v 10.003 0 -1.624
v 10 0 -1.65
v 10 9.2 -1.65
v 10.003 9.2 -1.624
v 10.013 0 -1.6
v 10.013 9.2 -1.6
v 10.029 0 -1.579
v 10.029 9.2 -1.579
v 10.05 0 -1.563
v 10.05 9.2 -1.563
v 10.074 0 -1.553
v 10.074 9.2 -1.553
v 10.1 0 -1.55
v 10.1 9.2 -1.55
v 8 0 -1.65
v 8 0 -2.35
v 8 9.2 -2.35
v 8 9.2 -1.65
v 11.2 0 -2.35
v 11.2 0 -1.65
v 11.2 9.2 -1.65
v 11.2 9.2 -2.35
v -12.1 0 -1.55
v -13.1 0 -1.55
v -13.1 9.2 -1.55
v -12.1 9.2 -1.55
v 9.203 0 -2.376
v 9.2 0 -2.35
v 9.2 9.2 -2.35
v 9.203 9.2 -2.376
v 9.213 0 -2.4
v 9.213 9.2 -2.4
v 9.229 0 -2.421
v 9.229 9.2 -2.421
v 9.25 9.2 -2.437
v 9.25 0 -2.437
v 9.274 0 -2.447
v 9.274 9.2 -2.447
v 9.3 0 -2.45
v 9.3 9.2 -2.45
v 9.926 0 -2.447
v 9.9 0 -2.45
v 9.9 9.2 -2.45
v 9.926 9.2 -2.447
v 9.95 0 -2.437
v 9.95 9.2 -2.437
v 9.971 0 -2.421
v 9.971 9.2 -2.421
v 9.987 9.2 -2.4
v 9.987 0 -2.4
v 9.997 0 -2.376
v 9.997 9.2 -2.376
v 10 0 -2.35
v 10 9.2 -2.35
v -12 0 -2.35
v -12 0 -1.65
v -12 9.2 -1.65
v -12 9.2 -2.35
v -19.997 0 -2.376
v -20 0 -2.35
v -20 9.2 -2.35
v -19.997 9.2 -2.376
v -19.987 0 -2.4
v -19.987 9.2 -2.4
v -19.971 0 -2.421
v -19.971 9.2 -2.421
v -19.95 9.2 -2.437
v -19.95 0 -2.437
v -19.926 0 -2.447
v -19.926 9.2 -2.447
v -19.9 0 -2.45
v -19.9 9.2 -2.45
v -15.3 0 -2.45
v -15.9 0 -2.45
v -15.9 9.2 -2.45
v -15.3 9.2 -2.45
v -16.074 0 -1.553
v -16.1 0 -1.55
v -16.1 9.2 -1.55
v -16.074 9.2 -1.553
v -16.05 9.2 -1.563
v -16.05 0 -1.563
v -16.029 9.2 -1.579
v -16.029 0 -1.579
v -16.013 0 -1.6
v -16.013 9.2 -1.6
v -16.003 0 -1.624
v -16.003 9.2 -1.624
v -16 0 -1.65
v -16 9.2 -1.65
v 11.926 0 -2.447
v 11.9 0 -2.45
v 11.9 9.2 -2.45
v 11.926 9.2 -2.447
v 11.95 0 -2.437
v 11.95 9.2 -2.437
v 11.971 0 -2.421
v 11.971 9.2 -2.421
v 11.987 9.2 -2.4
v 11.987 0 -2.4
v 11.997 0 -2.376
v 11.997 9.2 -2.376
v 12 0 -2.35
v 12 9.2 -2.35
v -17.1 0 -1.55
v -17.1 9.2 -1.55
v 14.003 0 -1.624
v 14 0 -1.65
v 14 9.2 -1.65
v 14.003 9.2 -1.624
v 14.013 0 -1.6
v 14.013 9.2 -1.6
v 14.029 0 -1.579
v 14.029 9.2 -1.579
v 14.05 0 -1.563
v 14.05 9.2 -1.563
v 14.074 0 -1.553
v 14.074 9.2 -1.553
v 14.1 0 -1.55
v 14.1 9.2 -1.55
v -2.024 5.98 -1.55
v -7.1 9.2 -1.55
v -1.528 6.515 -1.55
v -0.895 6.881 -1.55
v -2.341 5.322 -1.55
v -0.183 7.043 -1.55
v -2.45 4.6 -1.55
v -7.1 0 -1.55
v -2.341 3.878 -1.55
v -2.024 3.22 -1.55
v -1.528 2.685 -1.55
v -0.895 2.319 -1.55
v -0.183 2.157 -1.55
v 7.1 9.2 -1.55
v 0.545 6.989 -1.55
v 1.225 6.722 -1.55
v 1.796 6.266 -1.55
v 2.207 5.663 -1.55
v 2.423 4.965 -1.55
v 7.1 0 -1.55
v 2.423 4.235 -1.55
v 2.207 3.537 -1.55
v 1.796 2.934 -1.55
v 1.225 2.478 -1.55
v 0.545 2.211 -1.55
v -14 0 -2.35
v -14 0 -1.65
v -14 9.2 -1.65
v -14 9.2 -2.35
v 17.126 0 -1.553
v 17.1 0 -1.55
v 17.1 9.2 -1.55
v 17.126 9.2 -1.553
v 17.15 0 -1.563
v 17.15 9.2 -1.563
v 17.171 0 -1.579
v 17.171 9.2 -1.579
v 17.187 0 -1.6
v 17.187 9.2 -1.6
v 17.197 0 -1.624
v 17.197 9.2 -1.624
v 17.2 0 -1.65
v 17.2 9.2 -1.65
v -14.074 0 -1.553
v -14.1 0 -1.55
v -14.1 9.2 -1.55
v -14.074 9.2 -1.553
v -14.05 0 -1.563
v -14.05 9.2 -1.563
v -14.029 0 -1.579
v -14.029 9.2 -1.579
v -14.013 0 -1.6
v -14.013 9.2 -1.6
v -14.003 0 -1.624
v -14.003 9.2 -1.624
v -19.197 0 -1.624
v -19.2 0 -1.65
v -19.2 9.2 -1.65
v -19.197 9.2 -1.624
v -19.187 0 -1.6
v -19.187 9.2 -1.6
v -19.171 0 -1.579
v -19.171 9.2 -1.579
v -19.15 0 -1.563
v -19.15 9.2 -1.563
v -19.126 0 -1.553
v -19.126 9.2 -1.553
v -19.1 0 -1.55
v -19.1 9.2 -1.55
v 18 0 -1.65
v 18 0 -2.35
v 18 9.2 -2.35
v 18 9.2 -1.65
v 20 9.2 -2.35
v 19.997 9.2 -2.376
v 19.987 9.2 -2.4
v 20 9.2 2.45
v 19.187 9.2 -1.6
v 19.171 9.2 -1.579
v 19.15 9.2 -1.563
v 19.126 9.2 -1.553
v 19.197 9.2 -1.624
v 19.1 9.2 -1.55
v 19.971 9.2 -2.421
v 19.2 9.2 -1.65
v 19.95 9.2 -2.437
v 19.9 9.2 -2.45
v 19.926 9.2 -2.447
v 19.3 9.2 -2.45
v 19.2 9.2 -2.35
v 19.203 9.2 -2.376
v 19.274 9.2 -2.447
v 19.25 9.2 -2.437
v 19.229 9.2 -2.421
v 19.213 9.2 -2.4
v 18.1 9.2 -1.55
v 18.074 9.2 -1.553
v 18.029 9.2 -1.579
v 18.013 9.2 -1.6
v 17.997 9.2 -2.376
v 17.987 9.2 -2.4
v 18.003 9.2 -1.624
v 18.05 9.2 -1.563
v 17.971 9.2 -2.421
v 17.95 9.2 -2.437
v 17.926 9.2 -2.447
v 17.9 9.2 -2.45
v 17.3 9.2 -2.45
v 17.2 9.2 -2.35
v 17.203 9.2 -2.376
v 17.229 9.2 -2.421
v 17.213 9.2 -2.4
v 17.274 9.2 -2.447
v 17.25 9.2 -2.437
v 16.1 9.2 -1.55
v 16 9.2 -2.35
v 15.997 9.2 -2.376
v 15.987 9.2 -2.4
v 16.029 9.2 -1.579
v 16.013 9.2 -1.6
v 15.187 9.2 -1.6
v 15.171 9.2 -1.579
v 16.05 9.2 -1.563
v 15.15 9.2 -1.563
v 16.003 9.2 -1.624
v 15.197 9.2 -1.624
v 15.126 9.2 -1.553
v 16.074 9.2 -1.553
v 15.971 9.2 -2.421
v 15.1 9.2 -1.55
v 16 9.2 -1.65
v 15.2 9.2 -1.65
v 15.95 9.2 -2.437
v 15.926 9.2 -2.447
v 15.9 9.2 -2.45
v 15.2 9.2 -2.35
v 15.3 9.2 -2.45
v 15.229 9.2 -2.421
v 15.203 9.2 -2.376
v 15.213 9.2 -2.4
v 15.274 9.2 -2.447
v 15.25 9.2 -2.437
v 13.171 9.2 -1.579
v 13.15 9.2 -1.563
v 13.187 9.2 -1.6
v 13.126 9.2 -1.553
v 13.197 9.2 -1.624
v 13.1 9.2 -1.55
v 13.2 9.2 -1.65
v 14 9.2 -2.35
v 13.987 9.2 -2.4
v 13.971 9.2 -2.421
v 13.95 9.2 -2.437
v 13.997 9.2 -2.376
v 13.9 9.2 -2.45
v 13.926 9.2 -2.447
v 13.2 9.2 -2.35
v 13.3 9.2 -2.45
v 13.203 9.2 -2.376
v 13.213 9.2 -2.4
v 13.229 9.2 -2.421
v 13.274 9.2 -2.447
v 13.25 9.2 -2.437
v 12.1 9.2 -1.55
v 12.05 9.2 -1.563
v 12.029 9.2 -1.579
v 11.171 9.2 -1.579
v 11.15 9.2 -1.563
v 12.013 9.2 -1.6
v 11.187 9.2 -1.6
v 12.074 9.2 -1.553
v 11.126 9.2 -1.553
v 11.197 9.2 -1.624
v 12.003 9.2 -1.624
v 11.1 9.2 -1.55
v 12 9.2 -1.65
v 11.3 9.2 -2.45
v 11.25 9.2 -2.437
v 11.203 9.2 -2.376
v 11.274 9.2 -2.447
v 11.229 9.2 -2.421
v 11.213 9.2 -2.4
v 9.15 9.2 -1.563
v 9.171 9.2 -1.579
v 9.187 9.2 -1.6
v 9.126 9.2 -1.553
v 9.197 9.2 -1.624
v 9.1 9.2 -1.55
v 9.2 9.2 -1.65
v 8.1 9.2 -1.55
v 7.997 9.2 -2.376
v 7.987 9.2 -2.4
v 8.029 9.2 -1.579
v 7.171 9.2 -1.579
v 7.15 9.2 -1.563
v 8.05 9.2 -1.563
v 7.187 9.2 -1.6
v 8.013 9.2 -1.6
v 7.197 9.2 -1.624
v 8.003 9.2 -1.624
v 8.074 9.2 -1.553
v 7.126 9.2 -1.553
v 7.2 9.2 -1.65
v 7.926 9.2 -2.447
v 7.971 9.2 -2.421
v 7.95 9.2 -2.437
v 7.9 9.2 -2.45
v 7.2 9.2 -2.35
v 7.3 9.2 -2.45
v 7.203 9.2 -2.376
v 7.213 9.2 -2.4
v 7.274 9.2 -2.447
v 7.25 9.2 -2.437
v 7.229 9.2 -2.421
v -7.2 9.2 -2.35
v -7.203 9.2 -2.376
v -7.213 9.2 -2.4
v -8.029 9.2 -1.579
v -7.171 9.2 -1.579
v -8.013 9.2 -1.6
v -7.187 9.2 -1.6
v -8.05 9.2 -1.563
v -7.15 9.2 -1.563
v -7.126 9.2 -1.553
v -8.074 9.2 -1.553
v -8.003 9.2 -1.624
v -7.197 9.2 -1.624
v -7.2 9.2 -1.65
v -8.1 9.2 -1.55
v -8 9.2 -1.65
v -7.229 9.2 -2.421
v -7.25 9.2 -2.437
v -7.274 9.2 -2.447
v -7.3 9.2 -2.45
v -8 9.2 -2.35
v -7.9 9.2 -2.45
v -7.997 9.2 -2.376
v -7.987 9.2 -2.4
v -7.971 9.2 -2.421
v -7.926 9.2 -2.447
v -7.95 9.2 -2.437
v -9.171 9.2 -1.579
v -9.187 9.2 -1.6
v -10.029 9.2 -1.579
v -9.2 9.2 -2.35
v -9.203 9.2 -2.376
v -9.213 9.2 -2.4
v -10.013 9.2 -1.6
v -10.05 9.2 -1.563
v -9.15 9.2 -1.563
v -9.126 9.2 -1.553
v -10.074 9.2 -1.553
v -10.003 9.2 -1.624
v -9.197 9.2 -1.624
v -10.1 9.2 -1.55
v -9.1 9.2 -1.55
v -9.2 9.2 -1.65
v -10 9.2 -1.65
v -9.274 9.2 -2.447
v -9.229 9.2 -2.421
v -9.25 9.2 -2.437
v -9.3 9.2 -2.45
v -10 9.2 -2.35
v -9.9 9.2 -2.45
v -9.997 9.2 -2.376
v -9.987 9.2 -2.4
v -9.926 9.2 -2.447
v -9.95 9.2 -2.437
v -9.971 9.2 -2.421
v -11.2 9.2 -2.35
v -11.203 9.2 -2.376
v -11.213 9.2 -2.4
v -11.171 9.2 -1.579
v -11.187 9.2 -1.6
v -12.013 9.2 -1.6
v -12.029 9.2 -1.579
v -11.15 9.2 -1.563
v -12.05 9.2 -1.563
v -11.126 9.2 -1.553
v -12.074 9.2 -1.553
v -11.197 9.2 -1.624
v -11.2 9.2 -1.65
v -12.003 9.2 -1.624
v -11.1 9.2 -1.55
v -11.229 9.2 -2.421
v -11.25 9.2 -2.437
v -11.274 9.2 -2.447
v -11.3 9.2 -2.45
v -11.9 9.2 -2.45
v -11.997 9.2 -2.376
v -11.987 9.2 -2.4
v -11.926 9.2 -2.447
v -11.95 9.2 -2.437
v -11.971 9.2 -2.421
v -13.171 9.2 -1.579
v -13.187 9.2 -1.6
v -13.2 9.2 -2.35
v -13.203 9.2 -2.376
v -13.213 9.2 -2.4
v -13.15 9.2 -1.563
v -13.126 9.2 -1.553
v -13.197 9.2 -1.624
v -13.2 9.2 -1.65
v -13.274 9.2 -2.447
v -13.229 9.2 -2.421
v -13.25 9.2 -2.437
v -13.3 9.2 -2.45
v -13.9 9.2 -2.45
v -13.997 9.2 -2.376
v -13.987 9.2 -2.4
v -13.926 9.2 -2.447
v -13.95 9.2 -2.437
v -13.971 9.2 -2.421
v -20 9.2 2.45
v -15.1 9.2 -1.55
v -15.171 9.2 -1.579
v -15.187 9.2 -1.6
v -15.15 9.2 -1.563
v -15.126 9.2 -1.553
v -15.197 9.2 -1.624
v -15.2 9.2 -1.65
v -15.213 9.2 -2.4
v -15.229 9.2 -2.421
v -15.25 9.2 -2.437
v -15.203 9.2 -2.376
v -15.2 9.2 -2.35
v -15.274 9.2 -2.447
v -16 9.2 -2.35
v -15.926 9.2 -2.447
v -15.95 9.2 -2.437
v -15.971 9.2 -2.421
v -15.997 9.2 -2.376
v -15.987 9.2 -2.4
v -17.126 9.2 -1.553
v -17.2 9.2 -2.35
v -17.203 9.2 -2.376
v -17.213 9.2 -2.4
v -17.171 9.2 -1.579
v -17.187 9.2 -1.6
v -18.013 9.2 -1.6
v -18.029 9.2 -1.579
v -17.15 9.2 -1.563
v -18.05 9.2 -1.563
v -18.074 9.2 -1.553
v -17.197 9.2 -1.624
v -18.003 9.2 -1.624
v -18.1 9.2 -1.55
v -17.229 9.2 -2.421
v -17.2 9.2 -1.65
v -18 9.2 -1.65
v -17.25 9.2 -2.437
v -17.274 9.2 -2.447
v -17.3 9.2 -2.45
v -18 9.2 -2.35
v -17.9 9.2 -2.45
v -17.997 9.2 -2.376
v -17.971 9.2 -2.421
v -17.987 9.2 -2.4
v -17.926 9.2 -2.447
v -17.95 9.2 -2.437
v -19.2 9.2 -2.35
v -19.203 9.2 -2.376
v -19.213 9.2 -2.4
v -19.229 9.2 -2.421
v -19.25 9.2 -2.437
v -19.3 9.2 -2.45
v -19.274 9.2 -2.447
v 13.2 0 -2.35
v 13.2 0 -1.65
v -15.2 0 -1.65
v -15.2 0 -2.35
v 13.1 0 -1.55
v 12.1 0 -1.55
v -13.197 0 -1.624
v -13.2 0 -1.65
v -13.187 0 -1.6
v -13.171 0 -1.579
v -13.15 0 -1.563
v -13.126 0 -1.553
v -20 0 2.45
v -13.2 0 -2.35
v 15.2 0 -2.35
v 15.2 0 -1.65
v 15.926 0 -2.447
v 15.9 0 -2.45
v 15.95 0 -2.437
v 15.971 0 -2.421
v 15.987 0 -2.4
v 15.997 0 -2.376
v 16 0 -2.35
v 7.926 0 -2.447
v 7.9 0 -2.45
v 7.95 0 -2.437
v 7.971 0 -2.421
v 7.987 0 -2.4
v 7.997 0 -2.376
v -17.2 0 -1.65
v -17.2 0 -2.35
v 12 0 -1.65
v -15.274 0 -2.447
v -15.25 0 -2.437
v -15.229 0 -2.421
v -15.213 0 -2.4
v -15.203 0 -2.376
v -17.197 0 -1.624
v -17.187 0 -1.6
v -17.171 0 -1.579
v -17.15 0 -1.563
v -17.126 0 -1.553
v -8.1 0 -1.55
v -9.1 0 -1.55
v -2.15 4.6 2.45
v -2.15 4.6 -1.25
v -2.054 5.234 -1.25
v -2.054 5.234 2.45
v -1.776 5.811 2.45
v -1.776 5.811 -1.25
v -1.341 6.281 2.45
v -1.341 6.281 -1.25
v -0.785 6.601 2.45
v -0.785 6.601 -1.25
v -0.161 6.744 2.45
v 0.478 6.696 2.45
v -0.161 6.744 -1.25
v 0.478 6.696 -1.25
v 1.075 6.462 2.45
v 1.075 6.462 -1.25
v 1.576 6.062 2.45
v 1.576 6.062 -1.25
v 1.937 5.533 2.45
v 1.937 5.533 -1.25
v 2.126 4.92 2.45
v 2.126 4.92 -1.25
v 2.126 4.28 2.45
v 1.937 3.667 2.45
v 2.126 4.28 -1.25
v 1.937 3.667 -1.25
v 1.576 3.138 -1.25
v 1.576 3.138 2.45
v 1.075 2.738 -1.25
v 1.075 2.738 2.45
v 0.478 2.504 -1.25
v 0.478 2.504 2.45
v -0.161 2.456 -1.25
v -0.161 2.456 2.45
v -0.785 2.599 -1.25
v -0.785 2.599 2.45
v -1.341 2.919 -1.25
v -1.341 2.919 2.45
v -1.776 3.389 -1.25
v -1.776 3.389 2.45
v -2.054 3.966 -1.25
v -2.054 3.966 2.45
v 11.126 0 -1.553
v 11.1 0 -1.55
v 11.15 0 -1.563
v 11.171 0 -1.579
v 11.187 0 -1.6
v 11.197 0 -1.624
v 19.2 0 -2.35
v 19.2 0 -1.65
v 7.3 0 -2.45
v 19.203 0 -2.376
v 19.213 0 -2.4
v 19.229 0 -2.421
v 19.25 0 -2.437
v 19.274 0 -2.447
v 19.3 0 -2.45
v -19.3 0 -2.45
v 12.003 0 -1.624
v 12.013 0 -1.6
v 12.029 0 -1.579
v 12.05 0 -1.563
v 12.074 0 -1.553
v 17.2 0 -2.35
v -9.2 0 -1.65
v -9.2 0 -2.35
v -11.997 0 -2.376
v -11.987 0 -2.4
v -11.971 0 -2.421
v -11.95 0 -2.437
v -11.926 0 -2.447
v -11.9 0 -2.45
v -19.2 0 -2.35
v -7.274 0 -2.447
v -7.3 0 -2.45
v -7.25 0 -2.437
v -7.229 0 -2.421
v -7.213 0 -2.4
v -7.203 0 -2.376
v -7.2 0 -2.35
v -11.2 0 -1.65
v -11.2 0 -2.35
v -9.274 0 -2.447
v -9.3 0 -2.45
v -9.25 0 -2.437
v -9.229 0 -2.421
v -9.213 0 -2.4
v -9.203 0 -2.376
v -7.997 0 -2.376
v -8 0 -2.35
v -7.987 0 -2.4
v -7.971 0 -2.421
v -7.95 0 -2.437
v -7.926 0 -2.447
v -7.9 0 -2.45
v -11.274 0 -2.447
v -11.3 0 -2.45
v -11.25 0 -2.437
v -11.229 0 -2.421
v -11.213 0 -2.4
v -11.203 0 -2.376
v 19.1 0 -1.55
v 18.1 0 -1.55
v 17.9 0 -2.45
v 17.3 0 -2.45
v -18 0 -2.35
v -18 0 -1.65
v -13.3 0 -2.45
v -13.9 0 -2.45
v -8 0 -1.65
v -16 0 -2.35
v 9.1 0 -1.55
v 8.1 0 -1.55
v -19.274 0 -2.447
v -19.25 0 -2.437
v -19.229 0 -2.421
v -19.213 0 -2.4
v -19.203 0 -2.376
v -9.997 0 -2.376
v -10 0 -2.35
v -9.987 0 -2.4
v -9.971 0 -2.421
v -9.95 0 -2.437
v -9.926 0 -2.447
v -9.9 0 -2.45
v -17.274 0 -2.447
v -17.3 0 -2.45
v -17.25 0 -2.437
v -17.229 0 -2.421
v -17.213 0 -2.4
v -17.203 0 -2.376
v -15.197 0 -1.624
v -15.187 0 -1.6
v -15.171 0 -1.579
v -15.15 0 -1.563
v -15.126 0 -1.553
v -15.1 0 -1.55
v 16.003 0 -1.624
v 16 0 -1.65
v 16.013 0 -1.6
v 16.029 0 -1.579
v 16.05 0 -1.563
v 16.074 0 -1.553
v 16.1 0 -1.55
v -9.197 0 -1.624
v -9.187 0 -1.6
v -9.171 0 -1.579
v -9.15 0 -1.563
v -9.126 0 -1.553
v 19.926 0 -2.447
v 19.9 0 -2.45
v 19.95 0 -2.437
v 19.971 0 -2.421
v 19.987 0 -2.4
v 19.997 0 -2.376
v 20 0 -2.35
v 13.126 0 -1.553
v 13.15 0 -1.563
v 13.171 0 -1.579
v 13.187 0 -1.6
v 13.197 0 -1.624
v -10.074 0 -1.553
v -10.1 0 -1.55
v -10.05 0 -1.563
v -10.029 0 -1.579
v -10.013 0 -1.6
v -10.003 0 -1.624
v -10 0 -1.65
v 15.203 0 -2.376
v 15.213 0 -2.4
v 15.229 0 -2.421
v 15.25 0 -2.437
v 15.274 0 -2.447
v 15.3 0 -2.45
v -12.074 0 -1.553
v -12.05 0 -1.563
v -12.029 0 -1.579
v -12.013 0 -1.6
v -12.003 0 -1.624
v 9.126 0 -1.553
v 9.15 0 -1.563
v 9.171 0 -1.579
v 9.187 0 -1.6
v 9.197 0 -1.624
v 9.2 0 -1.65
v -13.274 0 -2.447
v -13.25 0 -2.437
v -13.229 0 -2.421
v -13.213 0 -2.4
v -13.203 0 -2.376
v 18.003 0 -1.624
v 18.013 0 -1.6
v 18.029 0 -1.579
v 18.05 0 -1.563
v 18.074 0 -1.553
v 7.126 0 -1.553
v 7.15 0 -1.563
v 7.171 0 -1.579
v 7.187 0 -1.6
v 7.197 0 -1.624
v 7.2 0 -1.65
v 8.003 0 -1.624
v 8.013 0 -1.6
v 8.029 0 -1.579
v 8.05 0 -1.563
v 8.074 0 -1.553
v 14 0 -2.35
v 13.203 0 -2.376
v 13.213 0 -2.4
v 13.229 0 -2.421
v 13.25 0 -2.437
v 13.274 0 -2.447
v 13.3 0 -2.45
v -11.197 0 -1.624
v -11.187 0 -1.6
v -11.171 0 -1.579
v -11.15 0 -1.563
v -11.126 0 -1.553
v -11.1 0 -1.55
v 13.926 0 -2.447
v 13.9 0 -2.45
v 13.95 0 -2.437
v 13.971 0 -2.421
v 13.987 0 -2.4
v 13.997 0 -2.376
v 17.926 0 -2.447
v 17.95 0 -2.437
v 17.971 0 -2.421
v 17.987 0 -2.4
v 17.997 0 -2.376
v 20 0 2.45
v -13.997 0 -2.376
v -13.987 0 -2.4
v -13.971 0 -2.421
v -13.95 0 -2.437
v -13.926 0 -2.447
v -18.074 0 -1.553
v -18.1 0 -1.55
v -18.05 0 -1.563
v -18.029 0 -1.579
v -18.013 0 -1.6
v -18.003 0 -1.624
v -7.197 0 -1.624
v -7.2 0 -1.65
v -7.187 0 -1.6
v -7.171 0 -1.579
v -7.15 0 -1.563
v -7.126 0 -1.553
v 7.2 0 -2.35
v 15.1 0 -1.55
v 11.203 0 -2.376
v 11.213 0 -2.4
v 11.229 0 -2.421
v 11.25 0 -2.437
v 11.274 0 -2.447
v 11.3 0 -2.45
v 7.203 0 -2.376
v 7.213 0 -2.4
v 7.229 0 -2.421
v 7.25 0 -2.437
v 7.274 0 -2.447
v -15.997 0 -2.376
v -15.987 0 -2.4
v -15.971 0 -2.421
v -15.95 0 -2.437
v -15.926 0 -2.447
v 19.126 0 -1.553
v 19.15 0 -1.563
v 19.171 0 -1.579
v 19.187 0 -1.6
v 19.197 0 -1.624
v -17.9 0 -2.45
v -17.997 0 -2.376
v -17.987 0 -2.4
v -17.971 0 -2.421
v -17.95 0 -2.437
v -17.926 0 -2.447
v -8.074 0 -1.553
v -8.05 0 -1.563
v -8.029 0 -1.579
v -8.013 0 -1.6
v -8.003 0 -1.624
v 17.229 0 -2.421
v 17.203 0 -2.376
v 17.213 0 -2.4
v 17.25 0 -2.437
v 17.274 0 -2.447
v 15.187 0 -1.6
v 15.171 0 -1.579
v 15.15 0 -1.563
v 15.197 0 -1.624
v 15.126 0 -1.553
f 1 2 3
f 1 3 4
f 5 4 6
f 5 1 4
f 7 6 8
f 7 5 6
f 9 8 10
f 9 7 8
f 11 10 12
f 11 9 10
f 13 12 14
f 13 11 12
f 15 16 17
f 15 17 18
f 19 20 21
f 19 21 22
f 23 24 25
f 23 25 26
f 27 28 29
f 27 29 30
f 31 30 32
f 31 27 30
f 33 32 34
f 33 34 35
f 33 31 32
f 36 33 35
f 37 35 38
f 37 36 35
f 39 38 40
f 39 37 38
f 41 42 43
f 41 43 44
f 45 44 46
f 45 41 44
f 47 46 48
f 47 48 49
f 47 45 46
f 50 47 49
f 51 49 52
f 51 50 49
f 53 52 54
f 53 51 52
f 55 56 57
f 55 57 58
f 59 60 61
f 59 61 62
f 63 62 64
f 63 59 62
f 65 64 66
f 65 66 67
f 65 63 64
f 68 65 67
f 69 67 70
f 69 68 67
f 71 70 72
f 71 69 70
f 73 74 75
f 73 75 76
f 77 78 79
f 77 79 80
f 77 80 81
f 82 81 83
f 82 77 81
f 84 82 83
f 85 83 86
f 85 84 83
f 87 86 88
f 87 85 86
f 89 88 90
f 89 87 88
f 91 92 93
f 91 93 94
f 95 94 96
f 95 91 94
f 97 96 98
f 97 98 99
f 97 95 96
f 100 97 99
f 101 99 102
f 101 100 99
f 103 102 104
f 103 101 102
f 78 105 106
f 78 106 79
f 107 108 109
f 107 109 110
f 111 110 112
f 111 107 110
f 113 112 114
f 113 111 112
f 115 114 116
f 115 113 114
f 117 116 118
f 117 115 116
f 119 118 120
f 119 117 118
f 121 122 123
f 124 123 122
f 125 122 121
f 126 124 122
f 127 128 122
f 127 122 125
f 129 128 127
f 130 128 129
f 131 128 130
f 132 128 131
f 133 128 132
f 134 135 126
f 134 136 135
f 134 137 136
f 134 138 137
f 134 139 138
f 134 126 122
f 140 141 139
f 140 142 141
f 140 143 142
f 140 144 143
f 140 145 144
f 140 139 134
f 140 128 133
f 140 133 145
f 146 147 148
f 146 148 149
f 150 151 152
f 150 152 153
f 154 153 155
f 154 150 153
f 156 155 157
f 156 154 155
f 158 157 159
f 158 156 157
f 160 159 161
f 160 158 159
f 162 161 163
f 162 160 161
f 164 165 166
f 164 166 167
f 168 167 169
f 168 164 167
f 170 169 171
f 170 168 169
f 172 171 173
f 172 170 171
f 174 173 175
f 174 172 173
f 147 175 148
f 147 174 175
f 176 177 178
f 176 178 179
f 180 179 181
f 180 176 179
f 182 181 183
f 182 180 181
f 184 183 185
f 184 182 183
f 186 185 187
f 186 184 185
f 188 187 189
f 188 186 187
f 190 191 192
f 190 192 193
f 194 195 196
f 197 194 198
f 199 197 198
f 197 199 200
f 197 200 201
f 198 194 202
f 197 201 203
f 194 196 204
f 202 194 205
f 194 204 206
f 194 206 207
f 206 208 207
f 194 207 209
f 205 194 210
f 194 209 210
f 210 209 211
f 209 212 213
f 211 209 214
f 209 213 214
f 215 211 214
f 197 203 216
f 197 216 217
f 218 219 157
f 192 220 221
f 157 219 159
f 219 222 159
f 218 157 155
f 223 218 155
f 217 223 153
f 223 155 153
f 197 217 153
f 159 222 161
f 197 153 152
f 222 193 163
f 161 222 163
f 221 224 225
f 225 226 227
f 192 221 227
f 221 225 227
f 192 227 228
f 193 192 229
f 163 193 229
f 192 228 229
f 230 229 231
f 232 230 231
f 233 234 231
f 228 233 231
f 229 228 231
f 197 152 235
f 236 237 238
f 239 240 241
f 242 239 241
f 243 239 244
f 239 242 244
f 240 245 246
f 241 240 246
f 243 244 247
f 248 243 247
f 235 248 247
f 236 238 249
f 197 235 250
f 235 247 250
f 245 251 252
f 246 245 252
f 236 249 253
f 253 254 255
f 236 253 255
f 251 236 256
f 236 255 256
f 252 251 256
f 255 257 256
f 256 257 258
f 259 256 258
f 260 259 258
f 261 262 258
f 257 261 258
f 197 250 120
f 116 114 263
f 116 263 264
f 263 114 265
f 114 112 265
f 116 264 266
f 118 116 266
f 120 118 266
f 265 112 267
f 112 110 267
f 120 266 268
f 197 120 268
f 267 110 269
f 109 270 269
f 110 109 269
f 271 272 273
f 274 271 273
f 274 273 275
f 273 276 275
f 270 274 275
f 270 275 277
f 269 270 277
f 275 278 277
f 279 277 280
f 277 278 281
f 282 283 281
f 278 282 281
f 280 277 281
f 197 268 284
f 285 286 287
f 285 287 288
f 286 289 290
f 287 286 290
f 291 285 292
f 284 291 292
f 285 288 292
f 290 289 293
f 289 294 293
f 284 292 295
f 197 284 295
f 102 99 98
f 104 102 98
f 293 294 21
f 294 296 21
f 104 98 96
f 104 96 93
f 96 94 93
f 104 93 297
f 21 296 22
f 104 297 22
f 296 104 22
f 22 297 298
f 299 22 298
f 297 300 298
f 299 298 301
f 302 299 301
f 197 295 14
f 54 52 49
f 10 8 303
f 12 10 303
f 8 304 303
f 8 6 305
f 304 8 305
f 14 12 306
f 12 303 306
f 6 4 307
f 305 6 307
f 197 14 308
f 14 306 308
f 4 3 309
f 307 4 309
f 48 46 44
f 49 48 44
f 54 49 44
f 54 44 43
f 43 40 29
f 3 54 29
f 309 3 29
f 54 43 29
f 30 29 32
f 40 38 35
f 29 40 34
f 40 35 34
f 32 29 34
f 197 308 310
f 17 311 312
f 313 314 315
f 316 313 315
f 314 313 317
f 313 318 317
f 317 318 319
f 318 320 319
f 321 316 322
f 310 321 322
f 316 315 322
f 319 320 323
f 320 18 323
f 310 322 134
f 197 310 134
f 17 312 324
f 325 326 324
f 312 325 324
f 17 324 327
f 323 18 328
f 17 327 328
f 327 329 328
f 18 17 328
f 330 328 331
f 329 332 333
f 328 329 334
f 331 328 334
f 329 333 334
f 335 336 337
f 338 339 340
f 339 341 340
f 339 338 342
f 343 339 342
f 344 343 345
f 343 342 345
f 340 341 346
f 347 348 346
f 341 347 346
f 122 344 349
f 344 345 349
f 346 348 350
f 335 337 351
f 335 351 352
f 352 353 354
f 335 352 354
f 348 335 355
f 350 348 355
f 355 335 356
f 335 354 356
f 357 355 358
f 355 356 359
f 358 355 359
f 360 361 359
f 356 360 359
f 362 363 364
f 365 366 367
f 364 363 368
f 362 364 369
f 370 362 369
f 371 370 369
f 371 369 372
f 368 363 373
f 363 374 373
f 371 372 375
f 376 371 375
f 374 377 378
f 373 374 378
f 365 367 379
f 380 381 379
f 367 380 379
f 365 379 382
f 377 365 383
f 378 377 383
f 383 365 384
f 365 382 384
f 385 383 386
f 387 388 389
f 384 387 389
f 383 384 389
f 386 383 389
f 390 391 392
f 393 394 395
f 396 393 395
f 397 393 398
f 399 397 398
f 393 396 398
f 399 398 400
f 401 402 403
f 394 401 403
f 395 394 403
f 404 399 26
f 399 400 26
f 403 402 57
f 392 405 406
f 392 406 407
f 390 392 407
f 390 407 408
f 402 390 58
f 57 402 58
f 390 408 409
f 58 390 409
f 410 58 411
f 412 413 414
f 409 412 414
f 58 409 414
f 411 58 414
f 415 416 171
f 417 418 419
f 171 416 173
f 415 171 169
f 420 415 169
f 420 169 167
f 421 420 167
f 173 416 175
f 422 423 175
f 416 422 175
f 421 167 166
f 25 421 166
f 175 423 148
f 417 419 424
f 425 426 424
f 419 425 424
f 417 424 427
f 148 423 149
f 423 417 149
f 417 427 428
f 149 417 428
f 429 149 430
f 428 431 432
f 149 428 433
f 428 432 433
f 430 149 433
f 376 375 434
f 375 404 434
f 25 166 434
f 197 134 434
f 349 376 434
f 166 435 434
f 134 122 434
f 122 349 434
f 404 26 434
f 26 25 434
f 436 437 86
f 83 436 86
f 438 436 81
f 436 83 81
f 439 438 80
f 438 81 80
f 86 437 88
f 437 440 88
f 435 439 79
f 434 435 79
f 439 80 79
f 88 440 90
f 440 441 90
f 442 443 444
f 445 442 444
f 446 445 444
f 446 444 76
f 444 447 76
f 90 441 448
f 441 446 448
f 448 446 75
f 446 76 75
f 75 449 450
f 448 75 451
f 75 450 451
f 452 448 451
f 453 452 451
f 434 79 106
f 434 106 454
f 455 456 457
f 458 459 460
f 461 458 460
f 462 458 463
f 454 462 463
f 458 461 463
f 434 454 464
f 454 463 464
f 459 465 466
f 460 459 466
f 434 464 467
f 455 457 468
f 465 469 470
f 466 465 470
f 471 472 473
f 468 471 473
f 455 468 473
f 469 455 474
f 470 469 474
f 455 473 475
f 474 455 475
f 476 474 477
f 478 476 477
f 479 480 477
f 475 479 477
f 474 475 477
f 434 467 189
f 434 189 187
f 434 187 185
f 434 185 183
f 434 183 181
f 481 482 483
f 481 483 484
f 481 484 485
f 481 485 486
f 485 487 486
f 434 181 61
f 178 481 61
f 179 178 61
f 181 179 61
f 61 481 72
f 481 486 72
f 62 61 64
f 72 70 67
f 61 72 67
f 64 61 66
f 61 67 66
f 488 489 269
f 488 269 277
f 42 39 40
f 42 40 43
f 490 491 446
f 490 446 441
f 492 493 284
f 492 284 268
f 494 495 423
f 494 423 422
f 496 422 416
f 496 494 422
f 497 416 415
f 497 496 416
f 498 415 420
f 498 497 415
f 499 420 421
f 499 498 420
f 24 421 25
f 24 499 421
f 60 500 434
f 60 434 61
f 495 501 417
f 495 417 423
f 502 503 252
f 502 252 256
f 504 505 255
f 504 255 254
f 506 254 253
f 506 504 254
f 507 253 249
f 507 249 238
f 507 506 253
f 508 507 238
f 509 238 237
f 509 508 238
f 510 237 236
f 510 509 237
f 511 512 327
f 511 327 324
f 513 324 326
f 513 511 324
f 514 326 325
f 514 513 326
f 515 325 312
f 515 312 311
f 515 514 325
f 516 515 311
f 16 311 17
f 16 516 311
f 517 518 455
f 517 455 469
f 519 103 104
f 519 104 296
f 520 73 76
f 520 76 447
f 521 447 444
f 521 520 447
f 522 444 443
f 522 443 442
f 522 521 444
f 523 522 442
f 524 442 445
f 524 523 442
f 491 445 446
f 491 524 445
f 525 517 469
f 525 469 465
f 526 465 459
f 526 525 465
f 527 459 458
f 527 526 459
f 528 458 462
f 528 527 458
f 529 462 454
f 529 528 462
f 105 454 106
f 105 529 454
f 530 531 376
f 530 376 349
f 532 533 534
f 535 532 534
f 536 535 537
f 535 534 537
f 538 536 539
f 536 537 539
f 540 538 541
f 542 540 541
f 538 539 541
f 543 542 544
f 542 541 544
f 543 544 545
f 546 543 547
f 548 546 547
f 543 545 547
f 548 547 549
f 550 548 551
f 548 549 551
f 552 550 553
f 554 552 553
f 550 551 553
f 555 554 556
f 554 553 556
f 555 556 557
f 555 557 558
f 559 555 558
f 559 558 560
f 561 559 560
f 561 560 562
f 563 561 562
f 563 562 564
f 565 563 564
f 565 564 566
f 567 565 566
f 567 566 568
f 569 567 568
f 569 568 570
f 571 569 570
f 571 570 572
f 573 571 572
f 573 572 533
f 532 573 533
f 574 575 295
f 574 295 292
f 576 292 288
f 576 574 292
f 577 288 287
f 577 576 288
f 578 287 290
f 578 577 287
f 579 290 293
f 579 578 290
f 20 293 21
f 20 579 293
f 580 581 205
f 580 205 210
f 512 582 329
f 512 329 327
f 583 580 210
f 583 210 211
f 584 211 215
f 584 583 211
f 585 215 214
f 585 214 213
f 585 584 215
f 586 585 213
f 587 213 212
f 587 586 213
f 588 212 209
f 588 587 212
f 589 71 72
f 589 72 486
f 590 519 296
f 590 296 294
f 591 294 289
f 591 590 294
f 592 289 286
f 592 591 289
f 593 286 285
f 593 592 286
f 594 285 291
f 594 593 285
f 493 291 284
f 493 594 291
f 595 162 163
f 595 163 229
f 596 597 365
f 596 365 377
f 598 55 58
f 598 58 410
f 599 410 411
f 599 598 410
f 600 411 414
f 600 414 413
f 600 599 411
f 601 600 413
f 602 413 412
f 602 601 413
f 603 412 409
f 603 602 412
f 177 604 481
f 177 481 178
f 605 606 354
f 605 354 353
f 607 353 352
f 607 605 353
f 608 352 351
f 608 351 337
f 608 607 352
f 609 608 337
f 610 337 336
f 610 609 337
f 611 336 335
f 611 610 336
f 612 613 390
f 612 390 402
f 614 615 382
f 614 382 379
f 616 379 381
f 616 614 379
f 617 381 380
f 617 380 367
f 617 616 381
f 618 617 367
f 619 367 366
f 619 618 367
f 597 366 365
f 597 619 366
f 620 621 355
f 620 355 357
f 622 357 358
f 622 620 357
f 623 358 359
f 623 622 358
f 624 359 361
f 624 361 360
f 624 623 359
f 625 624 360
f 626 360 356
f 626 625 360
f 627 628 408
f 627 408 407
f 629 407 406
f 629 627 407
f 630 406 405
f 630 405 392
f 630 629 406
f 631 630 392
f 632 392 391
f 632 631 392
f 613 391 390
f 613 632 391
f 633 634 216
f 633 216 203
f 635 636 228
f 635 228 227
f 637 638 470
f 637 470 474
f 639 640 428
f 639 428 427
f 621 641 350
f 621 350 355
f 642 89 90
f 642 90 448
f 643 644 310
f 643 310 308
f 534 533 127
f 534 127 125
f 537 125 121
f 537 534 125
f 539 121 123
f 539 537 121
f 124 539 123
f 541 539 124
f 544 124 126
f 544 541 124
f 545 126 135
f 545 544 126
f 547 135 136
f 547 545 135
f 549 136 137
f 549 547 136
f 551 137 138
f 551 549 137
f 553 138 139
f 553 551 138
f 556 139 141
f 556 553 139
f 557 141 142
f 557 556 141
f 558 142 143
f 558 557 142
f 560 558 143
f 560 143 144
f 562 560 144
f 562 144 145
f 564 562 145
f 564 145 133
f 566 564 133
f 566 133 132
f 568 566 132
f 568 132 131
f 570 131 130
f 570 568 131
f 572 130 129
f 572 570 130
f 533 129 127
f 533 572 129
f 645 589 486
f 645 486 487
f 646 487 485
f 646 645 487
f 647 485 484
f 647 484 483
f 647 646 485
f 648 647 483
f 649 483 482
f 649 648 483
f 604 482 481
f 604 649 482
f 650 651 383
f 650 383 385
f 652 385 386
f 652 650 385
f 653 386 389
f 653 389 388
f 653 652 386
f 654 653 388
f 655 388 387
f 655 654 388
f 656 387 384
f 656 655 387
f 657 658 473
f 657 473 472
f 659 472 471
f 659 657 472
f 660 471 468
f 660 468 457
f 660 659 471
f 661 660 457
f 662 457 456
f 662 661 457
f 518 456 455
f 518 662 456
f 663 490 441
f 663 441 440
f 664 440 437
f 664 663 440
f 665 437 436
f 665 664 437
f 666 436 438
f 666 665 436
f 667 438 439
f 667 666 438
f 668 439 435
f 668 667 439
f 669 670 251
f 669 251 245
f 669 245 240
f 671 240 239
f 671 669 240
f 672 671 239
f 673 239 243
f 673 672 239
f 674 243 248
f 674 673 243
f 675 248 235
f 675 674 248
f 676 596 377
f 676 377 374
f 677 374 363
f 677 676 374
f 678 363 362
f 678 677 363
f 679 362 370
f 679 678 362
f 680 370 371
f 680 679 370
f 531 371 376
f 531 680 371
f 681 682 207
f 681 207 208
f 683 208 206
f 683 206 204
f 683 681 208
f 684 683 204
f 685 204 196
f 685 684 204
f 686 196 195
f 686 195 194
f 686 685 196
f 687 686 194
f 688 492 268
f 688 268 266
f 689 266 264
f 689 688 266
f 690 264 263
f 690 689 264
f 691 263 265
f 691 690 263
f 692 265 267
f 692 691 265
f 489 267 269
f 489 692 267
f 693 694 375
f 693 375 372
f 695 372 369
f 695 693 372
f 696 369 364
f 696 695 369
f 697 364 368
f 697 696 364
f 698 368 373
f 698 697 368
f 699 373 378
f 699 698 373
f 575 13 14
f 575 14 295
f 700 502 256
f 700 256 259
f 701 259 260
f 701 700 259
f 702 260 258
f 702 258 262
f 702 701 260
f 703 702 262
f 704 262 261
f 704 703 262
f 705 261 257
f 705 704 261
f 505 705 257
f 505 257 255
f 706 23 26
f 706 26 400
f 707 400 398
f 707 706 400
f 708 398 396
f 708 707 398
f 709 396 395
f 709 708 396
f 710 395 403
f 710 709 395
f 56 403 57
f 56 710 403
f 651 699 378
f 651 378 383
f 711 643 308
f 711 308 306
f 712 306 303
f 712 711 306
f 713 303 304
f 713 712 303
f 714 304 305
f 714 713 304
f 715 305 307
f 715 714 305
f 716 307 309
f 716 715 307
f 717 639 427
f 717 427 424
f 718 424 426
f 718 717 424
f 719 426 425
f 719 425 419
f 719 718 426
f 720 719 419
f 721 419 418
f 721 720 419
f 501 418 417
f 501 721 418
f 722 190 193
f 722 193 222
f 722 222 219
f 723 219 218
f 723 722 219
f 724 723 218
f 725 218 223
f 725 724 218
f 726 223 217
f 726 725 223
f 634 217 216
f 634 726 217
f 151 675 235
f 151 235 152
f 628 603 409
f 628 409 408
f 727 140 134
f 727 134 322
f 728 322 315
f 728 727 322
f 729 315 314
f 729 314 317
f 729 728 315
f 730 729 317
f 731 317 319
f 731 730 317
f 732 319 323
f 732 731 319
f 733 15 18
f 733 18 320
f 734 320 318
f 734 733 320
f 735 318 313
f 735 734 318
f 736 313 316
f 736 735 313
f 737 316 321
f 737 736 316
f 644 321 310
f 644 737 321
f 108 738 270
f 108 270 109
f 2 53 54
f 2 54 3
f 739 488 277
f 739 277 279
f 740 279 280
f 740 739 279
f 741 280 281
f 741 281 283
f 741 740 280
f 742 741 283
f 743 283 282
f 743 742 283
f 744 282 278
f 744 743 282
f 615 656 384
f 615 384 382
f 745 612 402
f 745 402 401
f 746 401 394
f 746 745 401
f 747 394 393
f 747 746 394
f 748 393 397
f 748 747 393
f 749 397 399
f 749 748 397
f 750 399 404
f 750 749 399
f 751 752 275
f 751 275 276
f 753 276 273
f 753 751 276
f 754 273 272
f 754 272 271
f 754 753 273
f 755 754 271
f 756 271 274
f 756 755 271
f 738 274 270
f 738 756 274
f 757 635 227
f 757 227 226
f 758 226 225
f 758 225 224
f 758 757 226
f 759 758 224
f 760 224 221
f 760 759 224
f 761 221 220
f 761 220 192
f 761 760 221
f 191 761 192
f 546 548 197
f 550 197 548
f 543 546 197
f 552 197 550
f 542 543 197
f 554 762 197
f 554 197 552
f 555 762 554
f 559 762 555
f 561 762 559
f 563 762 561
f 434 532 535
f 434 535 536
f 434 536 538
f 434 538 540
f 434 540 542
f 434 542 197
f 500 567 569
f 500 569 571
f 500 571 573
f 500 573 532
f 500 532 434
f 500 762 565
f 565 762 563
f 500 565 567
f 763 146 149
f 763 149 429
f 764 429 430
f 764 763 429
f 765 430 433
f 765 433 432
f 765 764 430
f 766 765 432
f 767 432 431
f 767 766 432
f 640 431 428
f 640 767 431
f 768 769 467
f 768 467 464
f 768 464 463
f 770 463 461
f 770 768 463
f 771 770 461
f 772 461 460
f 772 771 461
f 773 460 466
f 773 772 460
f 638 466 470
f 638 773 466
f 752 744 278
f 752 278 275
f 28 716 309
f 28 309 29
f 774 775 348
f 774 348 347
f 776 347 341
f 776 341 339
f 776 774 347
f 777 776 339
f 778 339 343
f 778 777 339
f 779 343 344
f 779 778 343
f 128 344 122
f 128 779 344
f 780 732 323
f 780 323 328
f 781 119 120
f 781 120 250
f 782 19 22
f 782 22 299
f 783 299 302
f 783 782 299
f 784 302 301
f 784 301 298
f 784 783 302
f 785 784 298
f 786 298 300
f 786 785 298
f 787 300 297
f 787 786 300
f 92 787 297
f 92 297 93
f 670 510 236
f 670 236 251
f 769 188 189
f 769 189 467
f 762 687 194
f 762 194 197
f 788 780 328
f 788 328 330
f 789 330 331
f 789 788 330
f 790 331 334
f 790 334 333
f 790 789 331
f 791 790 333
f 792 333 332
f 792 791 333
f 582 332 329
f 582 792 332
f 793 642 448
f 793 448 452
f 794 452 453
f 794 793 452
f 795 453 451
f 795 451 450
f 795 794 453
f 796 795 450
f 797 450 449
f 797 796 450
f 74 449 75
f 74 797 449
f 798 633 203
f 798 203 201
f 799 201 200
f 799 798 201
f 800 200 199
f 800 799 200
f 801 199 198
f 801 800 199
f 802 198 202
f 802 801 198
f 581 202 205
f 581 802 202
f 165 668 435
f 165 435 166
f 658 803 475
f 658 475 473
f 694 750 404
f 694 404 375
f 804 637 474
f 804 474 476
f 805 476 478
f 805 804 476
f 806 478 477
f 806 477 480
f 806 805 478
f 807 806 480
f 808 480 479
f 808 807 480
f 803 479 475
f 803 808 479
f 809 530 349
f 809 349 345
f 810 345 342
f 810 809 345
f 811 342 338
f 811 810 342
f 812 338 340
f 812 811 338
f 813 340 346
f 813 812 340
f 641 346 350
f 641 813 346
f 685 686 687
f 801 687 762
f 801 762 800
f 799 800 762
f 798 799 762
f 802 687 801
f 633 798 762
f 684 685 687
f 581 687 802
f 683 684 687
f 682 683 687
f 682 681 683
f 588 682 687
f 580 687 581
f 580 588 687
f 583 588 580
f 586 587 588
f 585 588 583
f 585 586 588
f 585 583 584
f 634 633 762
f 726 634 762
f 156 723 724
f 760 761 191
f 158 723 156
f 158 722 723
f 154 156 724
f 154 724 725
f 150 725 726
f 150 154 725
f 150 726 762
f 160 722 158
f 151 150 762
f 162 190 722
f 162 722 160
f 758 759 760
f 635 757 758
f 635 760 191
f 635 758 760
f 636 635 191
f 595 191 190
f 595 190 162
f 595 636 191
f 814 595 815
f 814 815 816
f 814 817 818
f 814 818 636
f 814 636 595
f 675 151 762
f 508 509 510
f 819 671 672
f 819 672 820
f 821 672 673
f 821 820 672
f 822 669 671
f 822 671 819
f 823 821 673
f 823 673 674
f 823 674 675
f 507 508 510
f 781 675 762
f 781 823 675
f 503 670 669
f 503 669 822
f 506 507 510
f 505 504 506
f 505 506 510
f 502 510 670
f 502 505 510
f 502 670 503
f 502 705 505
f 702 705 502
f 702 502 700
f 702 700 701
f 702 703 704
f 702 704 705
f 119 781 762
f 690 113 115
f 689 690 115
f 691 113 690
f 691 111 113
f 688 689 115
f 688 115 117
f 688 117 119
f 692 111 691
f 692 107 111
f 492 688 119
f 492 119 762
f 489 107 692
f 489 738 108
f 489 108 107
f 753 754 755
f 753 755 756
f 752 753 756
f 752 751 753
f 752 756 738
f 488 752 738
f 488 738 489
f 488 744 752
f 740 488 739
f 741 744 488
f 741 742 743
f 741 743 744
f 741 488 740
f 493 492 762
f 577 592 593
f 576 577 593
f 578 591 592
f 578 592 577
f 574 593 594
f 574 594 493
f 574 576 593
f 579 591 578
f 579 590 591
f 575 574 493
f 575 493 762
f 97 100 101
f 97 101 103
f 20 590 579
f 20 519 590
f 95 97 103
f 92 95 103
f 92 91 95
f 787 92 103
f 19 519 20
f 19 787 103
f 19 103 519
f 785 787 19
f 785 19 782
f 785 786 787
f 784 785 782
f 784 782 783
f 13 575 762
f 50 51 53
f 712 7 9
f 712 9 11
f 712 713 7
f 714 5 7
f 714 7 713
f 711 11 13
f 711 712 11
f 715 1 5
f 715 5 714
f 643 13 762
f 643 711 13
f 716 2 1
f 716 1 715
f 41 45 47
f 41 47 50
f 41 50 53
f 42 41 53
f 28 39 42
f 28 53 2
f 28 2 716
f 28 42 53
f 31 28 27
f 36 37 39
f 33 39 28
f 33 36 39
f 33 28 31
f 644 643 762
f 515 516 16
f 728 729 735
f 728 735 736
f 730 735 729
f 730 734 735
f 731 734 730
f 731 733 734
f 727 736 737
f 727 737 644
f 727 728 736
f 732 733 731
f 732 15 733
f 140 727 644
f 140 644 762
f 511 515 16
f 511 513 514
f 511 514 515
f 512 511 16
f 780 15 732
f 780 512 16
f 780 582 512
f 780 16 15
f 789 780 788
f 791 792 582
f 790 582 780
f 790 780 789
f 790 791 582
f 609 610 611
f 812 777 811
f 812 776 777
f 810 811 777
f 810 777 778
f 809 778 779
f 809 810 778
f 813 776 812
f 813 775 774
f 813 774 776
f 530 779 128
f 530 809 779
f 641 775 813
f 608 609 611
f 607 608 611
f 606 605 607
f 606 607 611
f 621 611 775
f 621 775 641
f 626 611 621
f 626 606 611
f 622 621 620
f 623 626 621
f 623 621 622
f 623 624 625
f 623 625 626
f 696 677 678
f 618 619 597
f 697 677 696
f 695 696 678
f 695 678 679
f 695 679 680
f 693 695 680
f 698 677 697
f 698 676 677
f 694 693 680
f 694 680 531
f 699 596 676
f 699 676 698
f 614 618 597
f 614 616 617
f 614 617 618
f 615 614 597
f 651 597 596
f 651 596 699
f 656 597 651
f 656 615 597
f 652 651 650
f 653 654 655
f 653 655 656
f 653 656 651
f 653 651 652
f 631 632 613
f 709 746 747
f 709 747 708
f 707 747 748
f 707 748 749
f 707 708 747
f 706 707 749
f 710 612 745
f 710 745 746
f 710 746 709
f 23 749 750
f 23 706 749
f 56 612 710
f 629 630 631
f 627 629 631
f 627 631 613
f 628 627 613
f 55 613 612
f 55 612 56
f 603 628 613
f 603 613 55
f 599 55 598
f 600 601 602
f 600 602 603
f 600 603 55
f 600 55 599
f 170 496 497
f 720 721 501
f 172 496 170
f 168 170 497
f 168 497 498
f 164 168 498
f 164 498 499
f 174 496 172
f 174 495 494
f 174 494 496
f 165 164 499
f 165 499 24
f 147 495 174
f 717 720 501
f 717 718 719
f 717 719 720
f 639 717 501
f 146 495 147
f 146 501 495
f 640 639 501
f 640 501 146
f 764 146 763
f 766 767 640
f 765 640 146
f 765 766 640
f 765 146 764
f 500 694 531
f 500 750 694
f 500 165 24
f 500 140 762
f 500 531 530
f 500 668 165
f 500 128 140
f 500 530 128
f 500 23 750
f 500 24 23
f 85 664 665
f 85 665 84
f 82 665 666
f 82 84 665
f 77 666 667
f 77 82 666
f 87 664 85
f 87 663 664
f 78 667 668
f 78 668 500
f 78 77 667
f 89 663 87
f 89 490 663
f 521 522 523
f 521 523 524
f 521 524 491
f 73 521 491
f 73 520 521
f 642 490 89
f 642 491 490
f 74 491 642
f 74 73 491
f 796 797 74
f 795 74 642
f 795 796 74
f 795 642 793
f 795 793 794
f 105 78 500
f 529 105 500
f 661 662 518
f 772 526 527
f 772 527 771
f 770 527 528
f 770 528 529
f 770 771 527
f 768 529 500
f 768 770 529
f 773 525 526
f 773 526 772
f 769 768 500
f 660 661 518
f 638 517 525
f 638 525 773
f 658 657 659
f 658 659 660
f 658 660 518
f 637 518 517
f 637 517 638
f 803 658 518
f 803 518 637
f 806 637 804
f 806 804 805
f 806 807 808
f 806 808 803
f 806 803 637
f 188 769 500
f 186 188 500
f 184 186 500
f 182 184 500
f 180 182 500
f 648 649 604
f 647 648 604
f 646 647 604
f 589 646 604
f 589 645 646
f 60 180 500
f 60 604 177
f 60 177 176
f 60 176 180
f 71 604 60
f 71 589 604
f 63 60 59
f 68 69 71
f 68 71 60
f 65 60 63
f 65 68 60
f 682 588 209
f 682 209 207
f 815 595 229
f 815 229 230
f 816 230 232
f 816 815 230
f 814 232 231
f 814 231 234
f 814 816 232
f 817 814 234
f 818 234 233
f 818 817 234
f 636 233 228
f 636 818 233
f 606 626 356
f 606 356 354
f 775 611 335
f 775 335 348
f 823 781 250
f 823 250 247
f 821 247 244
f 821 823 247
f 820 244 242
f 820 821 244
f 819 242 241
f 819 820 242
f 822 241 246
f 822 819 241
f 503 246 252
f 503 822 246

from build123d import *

# Parameters (mm, degrees)
RESSALTO_EXTRUS_O2_DEPTH = 9.2
ESBO_O5_R                = 2.15
CORTE_EXTRUS_O2_DEPTH    = 9.2
CHANFRO2_SIZE            = 0.3


with BuildPart() as part:
    # Esboço4 → Ressalto-extrusão2 (new body)
    with BuildSketch(Plane(origin=(0, 0, 0), x_dir=(1, 0, 0), z_dir=(0, 1, 0))):
        with BuildLine():
            Line((-19.2, 2.35), (-19.2, 1.65))
            ThreePointArc((-19.2, 1.65), (-19.170710678, 1.579289322), (-19.1, 1.55))
            Line((-19.1, 1.55), (-18.1, 1.55))
            ThreePointArc((-18.1, 1.55), (-18.029289322, 1.579289322), (-18, 1.65))
            Line((-18, 1.65), (-18, 2.35))
            ThreePointArc((-18, 2.35), (-17.970710678, 2.420710678), (-17.9, 2.45))
            Line((-17.9, 2.45), (-17.3, 2.45))
            ThreePointArc((-17.3, 2.45), (-17.229289322, 2.420710678), (-17.2, 2.35))
            Line((-17.2, 2.35), (-17.2, 1.65))
            ThreePointArc((-17.2, 1.65), (-17.170710678, 1.579289322), (-17.1, 1.55))
            Line((-17.1, 1.55), (-16.1, 1.55))
            ThreePointArc((-16.1, 1.55), (-16.029289322, 1.579289322), (-16, 1.65))
            Line((-16, 1.65), (-16, 2.35))
            ThreePointArc((-16, 2.35), (-15.970710678, 2.420710678), (-15.9, 2.45))
            Line((-15.9, 2.45), (-15.3, 2.45))
            ThreePointArc((-15.3, 2.45), (-15.229289322, 2.420710678), (-15.2, 2.35))
            Line((-15.2, 2.35), (-15.2, 1.65))
            ThreePointArc((-15.2, 1.65), (-15.170710678, 1.579289322), (-15.1, 1.55))
            Line((-15.1, 1.55), (-14.1, 1.55))
            ThreePointArc((-14.1, 1.55), (-14.029289322, 1.579289322), (-14, 1.65))
            Line((-14, 1.65), (-14, 2.35))
            ThreePointArc((-14, 2.35), (-13.970710678, 2.420710678), (-13.9, 2.45))
            Line((-13.9, 2.45), (-13.3, 2.45))
            ThreePointArc((-13.3, 2.45), (-13.229289322, 2.420710678), (-13.2, 2.35))
            Line((-13.2, 2.35), (-13.2, 1.65))
            ThreePointArc((-13.2, 1.65), (-13.170710678, 1.579289322), (-13.1, 1.55))
            Line((-13.1, 1.55), (-12.1, 1.55))
            ThreePointArc((-12.1, 1.55), (-12.029289322, 1.579289322), (-12, 1.65))
            Line((-12, 1.65), (-12, 2.35))
            ThreePointArc((-12, 2.35), (-11.970710678, 2.420710678), (-11.9, 2.45))
            Line((-11.9, 2.45), (-11.3, 2.45))
            ThreePointArc((-11.3, 2.45), (-11.229289322, 2.420710678), (-11.2, 2.35))
            Line((-11.2, 2.35), (-11.2, 1.65))
            ThreePointArc((-11.2, 1.65), (-11.170710678, 1.579289322), (-11.1, 1.55))
            Line((-11.1, 1.55), (-10.1, 1.55))
            ThreePointArc((-10.1, 1.55), (-10.029289322, 1.579289322), (-10, 1.65))
            Line((-10, 1.65), (-10, 2.35))
            ThreePointArc((-10, 2.35), (-9.970710678, 2.420710678), (-9.9, 2.45))
            Line((-9.9, 2.45), (-9.3, 2.45))
            ThreePointArc((-9.3, 2.45), (-9.229289322, 2.420710678), (-9.2, 2.35))
            Line((-9.2, 2.35), (-9.2, 1.65))
            ThreePointArc((-9.2, 1.65), (-9.170710678, 1.579289322), (-9.1, 1.55))
            Line((-9.1, 1.55), (-8.1, 1.55))
            ThreePointArc((-8.1, 1.55), (-8.029289322, 1.579289322), (-8, 1.65))
            Line((-8, 1.65), (-8, 2.35))
            ThreePointArc((-8, 2.35), (-7.970710678, 2.420710678), (-7.9, 2.45))
            Line((-7.9, 2.45), (-7.3, 2.45))
            ThreePointArc((-7.3, 2.45), (-7.229289322, 2.420710678), (-7.2, 2.35))
            Line((-7.2, 2.35), (-7.2, 1.65))
            ThreePointArc((-7.2, 1.65), (-7.170710678, 1.579289322), (-7.1, 1.55))
            Line((-7.1, 1.55), (7.1, 1.55))
            ThreePointArc((7.1, 1.55), (7.170710678, 1.579289322), (7.2, 1.65))
            Line((7.2, 1.65), (7.2, 2.35))
            ThreePointArc((7.2, 2.35), (7.229289322, 2.420710678), (7.3, 2.45))
            Line((7.3, 2.45), (7.9, 2.45))
            ThreePointArc((7.9, 2.45), (7.970710678, 2.420710678), (8, 2.35))
            Line((8, 2.35), (8, 1.65))
            ThreePointArc((8, 1.65), (8.029289322, 1.579289322), (8.1, 1.55))
            Line((8.1, 1.55), (9.1, 1.55))
            ThreePointArc((9.1, 1.55), (9.170710678, 1.579289322), (9.2, 1.65))
            Line((9.2, 1.65), (9.2, 2.35))
            ThreePointArc((9.2, 2.35), (9.229289322, 2.420710678), (9.3, 2.45))
            Line((9.3, 2.45), (9.9, 2.45))
            ThreePointArc((9.9, 2.45), (9.970710678, 2.420710678), (10, 2.35))
            Line((10, 2.35), (10, 1.65))
            ThreePointArc((10, 1.65), (10.029289322, 1.579289322), (10.1, 1.55))
            Line((10.1, 1.55), (11.1, 1.55))
            ThreePointArc((11.1, 1.55), (11.170710678, 1.579289322), (11.2, 1.65))
            Line((11.2, 1.65), (11.2, 2.35))
            ThreePointArc((11.2, 2.35), (11.229289322, 2.420710678), (11.3, 2.45))
            Line((11.3, 2.45), (11.9, 2.45))
            ThreePointArc((11.9, 2.45), (11.970710678, 2.420710678), (12, 2.35))
            Line((12, 2.35), (12, 1.65))
            ThreePointArc((12, 1.65), (12.029289322, 1.579289322), (12.1, 1.55))
            Line((12.1, 1.55), (13.1, 1.55))
            ThreePointArc((13.1, 1.55), (13.170710678, 1.579289322), (13.2, 1.65))
            Line((13.2, 1.65), (13.2, 2.35))
            ThreePointArc((13.2, 2.35), (13.229289322, 2.420710678), (13.3, 2.45))
            Line((13.3, 2.45), (13.9, 2.45))
            ThreePointArc((13.9, 2.45), (13.970710678, 2.420710678), (14, 2.35))
            Line((14, 2.35), (14, 1.65))
            ThreePointArc((14, 1.65), (14.029289322, 1.579289322), (14.1, 1.55))
            Line((14.1, 1.55), (15.1, 1.55))
            ThreePointArc((15.1, 1.55), (15.170710678, 1.579289322), (15.2, 1.65))
            Line((15.2, 1.65), (15.2, 2.35))
            ThreePointArc((15.2, 2.35), (15.229289322, 2.420710678), (15.3, 2.45))
            Line((15.3, 2.45), (15.9, 2.45))
            ThreePointArc((15.9, 2.45), (15.970710678, 2.420710678), (16, 2.35))
            Line((16, 2.35), (16, 1.65))
            ThreePointArc((16, 1.65), (16.029289322, 1.579289322), (16.1, 1.55))
            Line((16.1, 1.55), (17.1, 1.55))
            ThreePointArc((17.1, 1.55), (17.170710678, 1.579289322), (17.2, 1.65))
            Line((17.2, 1.65), (17.2, 2.35))
            ThreePointArc((17.2, 2.35), (17.229289322, 2.420710678), (17.3, 2.45))
            Line((17.3, 2.45), (17.9, 2.45))
            ThreePointArc((17.9, 2.45), (17.970710678, 2.420710678), (18, 2.35))
            Line((18, 2.35), (18, 1.65))
            ThreePointArc((18, 1.65), (18.029289322, 1.579289322), (18.1, 1.55))
            Line((18.1, 1.55), (19.1, 1.55))
            ThreePointArc((19.1, 1.55), (19.170710678, 1.579289322), (19.2, 1.65))
            Line((19.2, 1.65), (19.2, 2.35))
            ThreePointArc((19.2, 2.35), (19.229289322, 2.420710678), (19.3, 2.45))
            Line((19.3, 2.45), (19.9, 2.45))
            ThreePointArc((19.9, 2.45), (19.970710678, 2.420710678), (20, 2.35))
            Line((20, 2.35), (20, -2.45))
            Line((20, -2.45), (-20, -2.45))
            Line((-20, -2.45), (-20, 2.35))
            ThreePointArc((-20, 2.35), (-19.970710678, 2.420710678), (-19.9, 2.45))
            Line((-19.9, 2.45), (-19.3, 2.45))
            ThreePointArc((-19.3, 2.45), (-19.229289322, 2.420710678), (-19.2, 2.35))
        make_face()
    extrude(amount=RESSALTO_EXTRUS_O2_DEPTH)

    # Esboço5 → Corte-extrusão2 (cut)
    with BuildSketch(Plane(origin=(0, 0, -1.55), x_dir=(-1, 0, 0), z_dir=(0, 0, -1))):
        with Locations((0, 4.6)):
            Circle(ESBO_O5_R)
    extrude(amount=-CORTE_EXTRUS_O2_DEPTH, mode=Mode.SUBTRACT)

    # Chanfro2
    chanfro2_edges = [part.edges().sort_by_distance(p)[0] for p in [
        (2.15, 4.6, -1.55),
    ]]
    chamfer(chanfro2_edges, length=CHANFRO2_SIZE)


solid = part.part
